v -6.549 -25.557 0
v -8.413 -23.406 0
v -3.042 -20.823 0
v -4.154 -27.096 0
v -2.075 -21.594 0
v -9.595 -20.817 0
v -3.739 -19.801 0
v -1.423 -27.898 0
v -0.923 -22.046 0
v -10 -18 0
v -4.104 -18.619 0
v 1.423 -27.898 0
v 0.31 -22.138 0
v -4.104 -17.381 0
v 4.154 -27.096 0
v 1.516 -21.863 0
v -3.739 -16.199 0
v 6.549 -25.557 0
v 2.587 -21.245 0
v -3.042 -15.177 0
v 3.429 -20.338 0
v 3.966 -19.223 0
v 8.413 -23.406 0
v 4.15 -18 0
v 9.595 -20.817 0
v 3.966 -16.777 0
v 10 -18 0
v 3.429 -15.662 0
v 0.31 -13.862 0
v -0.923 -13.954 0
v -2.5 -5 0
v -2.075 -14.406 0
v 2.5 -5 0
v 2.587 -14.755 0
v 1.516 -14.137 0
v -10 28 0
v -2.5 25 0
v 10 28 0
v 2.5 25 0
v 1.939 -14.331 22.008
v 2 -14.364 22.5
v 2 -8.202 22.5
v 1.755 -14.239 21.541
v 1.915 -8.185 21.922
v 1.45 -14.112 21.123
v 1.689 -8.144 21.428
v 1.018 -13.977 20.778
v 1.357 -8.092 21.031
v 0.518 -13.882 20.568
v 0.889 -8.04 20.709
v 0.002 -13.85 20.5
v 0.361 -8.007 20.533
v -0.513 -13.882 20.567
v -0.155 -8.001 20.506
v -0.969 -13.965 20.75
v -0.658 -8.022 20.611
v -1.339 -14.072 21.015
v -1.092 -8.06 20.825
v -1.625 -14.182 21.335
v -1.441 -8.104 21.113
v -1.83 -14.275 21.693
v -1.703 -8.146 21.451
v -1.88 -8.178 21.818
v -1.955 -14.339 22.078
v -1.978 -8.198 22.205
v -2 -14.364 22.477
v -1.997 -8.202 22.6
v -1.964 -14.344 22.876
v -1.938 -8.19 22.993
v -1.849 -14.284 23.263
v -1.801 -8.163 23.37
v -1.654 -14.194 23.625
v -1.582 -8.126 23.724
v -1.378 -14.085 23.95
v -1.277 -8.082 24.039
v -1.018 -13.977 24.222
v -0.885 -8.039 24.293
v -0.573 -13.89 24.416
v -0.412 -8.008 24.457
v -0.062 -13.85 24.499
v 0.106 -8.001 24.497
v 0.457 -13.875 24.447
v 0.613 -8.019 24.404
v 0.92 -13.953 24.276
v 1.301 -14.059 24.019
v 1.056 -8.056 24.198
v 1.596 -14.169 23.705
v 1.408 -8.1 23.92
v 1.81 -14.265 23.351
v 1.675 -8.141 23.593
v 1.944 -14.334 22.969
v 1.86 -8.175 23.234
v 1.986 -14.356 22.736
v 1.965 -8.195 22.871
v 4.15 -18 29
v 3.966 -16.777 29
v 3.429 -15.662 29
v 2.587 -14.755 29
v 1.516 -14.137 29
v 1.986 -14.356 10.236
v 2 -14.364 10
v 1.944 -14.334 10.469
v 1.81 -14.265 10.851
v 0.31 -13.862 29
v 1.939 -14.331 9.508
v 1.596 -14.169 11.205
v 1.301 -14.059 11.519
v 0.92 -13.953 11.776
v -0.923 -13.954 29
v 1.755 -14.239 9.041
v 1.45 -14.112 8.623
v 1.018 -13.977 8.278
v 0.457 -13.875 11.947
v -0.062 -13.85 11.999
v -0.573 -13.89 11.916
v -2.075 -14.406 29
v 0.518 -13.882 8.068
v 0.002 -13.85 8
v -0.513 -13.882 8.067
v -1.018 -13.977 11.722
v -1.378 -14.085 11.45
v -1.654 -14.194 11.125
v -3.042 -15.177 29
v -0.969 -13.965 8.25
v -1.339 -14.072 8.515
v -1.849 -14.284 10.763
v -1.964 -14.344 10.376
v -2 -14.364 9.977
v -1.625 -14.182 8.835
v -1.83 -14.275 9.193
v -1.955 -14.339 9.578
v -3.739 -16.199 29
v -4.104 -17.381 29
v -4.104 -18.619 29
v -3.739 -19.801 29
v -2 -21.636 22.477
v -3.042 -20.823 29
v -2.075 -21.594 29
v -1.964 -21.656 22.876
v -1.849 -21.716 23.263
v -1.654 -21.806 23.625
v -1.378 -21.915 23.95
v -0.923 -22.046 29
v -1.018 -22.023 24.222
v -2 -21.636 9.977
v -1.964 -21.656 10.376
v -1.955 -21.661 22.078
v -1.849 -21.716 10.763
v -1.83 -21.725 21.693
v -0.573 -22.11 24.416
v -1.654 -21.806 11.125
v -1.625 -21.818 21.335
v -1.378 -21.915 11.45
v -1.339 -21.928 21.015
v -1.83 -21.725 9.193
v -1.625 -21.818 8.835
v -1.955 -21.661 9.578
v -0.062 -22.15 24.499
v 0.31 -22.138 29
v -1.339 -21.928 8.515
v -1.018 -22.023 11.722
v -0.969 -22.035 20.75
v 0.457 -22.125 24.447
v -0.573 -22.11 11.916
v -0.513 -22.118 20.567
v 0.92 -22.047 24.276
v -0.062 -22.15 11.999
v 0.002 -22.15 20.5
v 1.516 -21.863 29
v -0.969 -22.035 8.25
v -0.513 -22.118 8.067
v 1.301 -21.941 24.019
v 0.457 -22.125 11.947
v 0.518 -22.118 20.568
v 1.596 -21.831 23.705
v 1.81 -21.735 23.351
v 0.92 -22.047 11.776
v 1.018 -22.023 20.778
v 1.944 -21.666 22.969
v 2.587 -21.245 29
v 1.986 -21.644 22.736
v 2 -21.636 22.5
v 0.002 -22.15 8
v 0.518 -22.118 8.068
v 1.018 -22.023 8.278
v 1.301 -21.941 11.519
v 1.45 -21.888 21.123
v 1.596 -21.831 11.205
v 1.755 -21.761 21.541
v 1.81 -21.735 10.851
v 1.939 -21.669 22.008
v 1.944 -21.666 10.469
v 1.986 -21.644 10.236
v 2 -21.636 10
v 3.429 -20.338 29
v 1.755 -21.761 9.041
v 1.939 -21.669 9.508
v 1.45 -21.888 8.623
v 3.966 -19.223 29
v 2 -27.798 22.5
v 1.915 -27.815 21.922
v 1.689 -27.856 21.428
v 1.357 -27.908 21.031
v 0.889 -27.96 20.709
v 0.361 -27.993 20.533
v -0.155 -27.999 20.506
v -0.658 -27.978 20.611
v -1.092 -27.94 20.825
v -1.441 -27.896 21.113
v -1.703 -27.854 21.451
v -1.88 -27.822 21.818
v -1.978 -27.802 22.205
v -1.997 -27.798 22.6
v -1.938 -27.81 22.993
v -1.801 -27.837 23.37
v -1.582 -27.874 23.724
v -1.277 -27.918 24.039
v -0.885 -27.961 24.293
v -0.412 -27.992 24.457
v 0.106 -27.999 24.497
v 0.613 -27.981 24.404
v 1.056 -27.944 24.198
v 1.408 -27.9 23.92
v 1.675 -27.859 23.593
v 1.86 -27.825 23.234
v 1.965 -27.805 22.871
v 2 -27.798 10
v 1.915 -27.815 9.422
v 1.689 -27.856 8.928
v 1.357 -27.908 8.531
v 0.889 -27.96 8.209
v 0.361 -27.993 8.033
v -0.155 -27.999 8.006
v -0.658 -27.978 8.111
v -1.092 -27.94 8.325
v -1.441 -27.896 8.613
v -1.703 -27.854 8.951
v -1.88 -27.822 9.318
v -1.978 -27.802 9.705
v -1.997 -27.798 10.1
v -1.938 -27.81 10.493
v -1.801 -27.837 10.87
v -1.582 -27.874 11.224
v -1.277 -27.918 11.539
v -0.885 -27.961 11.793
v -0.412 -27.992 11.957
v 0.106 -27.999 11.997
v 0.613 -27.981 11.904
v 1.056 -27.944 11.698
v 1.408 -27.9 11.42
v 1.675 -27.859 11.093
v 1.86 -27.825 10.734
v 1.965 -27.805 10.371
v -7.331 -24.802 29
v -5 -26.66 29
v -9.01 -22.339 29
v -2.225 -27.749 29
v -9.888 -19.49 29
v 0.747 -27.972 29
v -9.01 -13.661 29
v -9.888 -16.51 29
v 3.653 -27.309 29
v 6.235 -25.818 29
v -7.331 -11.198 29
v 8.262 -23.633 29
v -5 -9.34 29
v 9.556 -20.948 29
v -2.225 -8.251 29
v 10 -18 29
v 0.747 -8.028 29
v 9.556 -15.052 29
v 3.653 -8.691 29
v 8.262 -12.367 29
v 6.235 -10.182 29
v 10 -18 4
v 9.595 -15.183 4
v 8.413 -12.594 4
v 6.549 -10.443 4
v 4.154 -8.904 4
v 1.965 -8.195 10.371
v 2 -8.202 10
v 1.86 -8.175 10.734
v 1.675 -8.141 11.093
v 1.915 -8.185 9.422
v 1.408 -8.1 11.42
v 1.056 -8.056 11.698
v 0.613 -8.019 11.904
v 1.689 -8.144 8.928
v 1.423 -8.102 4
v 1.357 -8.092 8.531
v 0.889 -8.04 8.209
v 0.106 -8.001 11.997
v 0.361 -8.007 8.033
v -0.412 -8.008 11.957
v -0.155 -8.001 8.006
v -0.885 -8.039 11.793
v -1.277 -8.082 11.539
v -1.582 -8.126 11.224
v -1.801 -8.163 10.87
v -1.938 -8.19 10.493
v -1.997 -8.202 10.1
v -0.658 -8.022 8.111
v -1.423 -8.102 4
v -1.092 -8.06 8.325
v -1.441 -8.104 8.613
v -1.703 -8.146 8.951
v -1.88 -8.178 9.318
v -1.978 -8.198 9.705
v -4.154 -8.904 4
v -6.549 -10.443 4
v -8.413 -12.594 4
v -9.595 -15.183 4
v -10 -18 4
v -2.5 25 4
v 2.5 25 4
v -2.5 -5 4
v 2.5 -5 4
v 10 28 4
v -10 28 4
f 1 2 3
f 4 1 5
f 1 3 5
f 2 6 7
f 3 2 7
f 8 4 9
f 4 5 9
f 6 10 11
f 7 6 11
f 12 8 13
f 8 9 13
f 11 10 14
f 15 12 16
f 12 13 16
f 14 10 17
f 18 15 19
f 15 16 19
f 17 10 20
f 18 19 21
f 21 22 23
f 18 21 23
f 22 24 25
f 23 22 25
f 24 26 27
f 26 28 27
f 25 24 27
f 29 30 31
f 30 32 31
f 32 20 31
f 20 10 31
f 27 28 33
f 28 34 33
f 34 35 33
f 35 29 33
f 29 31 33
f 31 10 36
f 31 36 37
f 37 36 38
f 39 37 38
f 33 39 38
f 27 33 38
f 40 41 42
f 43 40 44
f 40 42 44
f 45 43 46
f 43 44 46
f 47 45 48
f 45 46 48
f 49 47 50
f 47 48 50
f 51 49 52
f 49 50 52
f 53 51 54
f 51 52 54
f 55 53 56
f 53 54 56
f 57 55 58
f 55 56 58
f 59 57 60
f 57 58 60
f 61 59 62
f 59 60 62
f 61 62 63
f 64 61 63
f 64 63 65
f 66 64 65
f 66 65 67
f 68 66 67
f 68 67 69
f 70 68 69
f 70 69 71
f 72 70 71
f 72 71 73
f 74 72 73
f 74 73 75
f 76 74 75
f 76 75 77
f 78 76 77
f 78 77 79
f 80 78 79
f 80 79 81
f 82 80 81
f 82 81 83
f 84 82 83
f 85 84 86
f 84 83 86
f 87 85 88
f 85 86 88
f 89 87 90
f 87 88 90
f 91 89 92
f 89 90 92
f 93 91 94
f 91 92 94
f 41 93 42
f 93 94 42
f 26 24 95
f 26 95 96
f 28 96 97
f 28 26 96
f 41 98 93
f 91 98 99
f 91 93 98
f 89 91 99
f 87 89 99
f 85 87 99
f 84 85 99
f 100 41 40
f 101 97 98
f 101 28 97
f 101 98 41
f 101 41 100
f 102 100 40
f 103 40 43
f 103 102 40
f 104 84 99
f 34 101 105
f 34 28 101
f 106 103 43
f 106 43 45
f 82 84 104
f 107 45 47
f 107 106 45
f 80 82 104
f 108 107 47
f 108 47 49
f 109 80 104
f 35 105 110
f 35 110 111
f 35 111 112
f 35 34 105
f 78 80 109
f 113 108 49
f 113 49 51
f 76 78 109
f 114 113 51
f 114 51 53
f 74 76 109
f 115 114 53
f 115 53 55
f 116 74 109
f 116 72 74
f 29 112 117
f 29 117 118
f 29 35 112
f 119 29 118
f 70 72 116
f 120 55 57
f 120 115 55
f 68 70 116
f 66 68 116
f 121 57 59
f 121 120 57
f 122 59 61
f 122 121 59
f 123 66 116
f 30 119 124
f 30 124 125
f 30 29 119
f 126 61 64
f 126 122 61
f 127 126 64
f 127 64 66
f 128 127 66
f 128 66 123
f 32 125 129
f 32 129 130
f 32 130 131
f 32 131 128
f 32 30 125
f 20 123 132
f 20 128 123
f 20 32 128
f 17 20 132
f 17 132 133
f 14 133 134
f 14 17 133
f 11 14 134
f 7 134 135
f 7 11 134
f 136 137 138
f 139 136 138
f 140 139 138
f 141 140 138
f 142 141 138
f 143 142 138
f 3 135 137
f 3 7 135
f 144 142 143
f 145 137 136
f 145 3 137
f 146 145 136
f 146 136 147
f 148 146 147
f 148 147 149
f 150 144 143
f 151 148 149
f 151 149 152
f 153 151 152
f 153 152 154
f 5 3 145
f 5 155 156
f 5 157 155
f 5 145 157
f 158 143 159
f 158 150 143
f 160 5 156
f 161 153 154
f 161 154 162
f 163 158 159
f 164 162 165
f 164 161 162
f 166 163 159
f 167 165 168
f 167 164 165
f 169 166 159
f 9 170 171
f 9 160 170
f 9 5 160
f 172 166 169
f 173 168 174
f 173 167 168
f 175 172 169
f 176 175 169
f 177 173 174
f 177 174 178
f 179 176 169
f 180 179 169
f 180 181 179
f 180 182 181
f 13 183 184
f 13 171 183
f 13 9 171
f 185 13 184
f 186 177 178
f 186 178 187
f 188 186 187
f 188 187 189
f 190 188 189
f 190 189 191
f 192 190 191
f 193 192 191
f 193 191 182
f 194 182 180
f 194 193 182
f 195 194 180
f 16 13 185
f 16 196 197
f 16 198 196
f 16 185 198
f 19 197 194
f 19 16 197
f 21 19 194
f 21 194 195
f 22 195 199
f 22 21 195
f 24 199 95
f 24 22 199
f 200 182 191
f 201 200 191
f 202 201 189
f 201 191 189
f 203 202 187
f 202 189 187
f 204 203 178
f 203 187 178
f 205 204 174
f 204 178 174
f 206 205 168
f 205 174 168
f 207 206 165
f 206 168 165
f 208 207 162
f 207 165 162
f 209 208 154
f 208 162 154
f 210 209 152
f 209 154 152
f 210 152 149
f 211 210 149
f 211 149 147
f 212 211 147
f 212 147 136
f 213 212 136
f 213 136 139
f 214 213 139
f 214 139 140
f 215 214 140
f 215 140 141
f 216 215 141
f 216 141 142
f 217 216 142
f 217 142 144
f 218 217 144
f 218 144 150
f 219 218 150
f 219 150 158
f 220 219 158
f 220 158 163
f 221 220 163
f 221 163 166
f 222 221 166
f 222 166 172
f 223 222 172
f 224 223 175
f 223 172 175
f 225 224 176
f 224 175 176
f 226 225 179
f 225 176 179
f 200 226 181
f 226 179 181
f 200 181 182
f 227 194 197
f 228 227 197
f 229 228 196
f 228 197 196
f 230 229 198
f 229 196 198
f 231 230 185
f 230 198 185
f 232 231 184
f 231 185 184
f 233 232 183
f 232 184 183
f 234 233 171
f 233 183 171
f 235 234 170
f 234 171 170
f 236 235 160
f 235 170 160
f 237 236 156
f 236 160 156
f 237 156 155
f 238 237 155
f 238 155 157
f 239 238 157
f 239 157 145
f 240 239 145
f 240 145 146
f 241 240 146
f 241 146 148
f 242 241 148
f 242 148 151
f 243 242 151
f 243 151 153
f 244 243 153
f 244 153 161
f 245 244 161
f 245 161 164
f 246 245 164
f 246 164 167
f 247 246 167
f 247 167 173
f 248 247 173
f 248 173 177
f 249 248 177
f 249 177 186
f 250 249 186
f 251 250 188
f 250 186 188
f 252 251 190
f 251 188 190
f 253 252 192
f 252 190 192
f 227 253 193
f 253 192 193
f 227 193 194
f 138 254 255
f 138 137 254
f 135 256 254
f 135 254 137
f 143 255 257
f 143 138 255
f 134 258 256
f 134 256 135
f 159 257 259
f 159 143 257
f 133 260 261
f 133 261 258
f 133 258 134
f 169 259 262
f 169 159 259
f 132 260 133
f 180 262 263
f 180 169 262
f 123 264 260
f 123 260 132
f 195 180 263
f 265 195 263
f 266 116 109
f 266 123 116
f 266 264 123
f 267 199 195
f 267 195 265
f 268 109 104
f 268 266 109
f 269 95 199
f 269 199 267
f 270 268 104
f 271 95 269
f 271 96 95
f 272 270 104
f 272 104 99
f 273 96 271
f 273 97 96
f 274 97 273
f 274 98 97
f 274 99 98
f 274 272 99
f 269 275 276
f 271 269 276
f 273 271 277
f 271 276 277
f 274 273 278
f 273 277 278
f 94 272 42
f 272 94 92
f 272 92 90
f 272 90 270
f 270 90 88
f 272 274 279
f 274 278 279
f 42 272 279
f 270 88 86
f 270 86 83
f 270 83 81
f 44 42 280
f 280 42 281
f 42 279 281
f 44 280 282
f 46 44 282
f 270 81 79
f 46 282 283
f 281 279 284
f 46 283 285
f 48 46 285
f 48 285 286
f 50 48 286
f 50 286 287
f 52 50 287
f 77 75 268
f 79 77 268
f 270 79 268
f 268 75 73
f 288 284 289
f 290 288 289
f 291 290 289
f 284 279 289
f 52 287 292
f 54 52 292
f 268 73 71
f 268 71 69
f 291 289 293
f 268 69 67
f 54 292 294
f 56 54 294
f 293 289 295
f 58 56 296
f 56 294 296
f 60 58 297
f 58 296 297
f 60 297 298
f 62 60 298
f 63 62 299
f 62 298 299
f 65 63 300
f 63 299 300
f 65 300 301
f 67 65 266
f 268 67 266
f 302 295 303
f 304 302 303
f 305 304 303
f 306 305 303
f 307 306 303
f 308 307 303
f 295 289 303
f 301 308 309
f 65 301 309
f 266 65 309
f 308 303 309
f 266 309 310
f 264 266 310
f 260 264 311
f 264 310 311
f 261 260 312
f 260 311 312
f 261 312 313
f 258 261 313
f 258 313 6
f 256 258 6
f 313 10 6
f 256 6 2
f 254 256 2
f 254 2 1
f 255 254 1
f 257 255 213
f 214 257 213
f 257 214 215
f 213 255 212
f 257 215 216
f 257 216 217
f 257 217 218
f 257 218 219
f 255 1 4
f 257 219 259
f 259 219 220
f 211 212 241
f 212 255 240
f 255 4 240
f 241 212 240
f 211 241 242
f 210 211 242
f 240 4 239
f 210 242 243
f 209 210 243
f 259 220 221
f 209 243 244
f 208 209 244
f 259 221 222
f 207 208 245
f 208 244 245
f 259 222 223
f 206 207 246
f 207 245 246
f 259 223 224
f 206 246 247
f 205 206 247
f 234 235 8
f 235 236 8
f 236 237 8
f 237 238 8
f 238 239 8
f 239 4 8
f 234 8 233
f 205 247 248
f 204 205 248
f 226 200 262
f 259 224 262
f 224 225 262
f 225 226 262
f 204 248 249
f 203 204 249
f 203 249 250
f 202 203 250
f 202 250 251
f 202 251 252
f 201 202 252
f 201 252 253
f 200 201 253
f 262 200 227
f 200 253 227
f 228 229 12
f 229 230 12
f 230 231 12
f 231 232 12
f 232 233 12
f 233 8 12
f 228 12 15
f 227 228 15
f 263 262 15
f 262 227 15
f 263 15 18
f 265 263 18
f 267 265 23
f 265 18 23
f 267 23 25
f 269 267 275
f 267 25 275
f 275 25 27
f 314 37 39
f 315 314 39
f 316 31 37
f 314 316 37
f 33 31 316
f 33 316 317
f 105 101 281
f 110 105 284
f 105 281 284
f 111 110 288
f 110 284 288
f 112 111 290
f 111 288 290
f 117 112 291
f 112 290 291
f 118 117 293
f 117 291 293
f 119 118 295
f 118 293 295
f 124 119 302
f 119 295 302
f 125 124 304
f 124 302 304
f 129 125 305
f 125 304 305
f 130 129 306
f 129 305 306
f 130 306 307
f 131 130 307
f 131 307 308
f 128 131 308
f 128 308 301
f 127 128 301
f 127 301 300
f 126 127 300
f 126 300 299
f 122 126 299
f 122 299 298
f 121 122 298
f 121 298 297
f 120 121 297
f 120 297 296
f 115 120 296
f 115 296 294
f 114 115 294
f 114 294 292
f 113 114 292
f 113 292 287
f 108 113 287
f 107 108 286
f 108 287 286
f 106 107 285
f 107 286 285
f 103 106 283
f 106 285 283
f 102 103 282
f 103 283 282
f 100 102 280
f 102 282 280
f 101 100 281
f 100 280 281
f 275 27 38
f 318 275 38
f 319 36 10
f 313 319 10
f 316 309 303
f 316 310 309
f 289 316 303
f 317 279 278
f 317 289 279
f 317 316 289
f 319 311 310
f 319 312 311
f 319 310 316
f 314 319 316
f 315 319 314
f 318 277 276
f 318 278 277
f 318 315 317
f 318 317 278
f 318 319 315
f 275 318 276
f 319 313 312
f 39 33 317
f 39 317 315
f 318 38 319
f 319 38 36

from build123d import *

# Parameters (mm, degrees)
CROQUIS1_W              = 5
CROQUIS1_H              = 30
SALIENTE_EXTRUIR1_DEPTH = 4
SALIENTE_EXTRUIR2_START = 4
CROQUIS2_R              = 10
CROQUIS2_R_2            = 4.15
SALIENTE_EXTRUIR2_DEPTH = 25
CORTAR_EXTRUIR1_START   = 4
CROQUIS3_R              = 4.15
CORTAR_EXTRUIR1_DEPTH   = 4
CROQUIS4_R              = 2
CORTAR_EXTRUIR2_DEPTH   = 29


with BuildPart() as part:
    # Croquis1 → Saliente-Extruir1 (new body)
    with BuildSketch(Plane.XY):
        with BuildLine():
            Line((10, -18), (10, 28))
            Line((10, 28), (-10, 28))
            Line((-10, 28), (-10, -18))
            ThreePointArc((-10, -18), (0, -28), (10, -18))
        make_face()
        with Locations((0, 10)):
            Rectangle(CROQUIS1_W, CROQUIS1_H, mode=Mode.SUBTRACT)
    extrude(amount=SALIENTE_EXTRUIR1_DEPTH)

    # Croquis2 → Saliente-Extruir2 (add)
    with BuildSketch(Plane.XY.offset(SALIENTE_EXTRUIR2_START)):
        with Locations((0, -18)):
            Circle(CROQUIS2_R)
        with Locations((0, -18)):
            Circle(CROQUIS2_R_2, mode=Mode.SUBTRACT)
    extrude(amount=SALIENTE_EXTRUIR2_DEPTH)

    # Croquis3 → Cortar-Extruir1 (cut)
    with BuildSketch(Plane.XY.offset(CORTAR_EXTRUIR1_START)):
        with Locations((0, -18)):
            Circle(CROQUIS3_R)
    extrude(amount=-CORTAR_EXTRUIR1_DEPTH, mode=Mode.SUBTRACT)

    # Croquis4 → Cortar-Extruir2 (cut, through all)
    with BuildSketch(Plane(origin=(0, 0, 0), x_dir=(1, 0, 0), z_dir=(0, 1, 0))):
        with Locations((0, -10)):
            Circle(CROQUIS4_R)
        with Locations((0, -22.5)):
            Circle(CROQUIS4_R)
    extrude(amount=-CORTAR_EXTRUIR2_DEPTH, mode=Mode.SUBTRACT)


solid = part.part
